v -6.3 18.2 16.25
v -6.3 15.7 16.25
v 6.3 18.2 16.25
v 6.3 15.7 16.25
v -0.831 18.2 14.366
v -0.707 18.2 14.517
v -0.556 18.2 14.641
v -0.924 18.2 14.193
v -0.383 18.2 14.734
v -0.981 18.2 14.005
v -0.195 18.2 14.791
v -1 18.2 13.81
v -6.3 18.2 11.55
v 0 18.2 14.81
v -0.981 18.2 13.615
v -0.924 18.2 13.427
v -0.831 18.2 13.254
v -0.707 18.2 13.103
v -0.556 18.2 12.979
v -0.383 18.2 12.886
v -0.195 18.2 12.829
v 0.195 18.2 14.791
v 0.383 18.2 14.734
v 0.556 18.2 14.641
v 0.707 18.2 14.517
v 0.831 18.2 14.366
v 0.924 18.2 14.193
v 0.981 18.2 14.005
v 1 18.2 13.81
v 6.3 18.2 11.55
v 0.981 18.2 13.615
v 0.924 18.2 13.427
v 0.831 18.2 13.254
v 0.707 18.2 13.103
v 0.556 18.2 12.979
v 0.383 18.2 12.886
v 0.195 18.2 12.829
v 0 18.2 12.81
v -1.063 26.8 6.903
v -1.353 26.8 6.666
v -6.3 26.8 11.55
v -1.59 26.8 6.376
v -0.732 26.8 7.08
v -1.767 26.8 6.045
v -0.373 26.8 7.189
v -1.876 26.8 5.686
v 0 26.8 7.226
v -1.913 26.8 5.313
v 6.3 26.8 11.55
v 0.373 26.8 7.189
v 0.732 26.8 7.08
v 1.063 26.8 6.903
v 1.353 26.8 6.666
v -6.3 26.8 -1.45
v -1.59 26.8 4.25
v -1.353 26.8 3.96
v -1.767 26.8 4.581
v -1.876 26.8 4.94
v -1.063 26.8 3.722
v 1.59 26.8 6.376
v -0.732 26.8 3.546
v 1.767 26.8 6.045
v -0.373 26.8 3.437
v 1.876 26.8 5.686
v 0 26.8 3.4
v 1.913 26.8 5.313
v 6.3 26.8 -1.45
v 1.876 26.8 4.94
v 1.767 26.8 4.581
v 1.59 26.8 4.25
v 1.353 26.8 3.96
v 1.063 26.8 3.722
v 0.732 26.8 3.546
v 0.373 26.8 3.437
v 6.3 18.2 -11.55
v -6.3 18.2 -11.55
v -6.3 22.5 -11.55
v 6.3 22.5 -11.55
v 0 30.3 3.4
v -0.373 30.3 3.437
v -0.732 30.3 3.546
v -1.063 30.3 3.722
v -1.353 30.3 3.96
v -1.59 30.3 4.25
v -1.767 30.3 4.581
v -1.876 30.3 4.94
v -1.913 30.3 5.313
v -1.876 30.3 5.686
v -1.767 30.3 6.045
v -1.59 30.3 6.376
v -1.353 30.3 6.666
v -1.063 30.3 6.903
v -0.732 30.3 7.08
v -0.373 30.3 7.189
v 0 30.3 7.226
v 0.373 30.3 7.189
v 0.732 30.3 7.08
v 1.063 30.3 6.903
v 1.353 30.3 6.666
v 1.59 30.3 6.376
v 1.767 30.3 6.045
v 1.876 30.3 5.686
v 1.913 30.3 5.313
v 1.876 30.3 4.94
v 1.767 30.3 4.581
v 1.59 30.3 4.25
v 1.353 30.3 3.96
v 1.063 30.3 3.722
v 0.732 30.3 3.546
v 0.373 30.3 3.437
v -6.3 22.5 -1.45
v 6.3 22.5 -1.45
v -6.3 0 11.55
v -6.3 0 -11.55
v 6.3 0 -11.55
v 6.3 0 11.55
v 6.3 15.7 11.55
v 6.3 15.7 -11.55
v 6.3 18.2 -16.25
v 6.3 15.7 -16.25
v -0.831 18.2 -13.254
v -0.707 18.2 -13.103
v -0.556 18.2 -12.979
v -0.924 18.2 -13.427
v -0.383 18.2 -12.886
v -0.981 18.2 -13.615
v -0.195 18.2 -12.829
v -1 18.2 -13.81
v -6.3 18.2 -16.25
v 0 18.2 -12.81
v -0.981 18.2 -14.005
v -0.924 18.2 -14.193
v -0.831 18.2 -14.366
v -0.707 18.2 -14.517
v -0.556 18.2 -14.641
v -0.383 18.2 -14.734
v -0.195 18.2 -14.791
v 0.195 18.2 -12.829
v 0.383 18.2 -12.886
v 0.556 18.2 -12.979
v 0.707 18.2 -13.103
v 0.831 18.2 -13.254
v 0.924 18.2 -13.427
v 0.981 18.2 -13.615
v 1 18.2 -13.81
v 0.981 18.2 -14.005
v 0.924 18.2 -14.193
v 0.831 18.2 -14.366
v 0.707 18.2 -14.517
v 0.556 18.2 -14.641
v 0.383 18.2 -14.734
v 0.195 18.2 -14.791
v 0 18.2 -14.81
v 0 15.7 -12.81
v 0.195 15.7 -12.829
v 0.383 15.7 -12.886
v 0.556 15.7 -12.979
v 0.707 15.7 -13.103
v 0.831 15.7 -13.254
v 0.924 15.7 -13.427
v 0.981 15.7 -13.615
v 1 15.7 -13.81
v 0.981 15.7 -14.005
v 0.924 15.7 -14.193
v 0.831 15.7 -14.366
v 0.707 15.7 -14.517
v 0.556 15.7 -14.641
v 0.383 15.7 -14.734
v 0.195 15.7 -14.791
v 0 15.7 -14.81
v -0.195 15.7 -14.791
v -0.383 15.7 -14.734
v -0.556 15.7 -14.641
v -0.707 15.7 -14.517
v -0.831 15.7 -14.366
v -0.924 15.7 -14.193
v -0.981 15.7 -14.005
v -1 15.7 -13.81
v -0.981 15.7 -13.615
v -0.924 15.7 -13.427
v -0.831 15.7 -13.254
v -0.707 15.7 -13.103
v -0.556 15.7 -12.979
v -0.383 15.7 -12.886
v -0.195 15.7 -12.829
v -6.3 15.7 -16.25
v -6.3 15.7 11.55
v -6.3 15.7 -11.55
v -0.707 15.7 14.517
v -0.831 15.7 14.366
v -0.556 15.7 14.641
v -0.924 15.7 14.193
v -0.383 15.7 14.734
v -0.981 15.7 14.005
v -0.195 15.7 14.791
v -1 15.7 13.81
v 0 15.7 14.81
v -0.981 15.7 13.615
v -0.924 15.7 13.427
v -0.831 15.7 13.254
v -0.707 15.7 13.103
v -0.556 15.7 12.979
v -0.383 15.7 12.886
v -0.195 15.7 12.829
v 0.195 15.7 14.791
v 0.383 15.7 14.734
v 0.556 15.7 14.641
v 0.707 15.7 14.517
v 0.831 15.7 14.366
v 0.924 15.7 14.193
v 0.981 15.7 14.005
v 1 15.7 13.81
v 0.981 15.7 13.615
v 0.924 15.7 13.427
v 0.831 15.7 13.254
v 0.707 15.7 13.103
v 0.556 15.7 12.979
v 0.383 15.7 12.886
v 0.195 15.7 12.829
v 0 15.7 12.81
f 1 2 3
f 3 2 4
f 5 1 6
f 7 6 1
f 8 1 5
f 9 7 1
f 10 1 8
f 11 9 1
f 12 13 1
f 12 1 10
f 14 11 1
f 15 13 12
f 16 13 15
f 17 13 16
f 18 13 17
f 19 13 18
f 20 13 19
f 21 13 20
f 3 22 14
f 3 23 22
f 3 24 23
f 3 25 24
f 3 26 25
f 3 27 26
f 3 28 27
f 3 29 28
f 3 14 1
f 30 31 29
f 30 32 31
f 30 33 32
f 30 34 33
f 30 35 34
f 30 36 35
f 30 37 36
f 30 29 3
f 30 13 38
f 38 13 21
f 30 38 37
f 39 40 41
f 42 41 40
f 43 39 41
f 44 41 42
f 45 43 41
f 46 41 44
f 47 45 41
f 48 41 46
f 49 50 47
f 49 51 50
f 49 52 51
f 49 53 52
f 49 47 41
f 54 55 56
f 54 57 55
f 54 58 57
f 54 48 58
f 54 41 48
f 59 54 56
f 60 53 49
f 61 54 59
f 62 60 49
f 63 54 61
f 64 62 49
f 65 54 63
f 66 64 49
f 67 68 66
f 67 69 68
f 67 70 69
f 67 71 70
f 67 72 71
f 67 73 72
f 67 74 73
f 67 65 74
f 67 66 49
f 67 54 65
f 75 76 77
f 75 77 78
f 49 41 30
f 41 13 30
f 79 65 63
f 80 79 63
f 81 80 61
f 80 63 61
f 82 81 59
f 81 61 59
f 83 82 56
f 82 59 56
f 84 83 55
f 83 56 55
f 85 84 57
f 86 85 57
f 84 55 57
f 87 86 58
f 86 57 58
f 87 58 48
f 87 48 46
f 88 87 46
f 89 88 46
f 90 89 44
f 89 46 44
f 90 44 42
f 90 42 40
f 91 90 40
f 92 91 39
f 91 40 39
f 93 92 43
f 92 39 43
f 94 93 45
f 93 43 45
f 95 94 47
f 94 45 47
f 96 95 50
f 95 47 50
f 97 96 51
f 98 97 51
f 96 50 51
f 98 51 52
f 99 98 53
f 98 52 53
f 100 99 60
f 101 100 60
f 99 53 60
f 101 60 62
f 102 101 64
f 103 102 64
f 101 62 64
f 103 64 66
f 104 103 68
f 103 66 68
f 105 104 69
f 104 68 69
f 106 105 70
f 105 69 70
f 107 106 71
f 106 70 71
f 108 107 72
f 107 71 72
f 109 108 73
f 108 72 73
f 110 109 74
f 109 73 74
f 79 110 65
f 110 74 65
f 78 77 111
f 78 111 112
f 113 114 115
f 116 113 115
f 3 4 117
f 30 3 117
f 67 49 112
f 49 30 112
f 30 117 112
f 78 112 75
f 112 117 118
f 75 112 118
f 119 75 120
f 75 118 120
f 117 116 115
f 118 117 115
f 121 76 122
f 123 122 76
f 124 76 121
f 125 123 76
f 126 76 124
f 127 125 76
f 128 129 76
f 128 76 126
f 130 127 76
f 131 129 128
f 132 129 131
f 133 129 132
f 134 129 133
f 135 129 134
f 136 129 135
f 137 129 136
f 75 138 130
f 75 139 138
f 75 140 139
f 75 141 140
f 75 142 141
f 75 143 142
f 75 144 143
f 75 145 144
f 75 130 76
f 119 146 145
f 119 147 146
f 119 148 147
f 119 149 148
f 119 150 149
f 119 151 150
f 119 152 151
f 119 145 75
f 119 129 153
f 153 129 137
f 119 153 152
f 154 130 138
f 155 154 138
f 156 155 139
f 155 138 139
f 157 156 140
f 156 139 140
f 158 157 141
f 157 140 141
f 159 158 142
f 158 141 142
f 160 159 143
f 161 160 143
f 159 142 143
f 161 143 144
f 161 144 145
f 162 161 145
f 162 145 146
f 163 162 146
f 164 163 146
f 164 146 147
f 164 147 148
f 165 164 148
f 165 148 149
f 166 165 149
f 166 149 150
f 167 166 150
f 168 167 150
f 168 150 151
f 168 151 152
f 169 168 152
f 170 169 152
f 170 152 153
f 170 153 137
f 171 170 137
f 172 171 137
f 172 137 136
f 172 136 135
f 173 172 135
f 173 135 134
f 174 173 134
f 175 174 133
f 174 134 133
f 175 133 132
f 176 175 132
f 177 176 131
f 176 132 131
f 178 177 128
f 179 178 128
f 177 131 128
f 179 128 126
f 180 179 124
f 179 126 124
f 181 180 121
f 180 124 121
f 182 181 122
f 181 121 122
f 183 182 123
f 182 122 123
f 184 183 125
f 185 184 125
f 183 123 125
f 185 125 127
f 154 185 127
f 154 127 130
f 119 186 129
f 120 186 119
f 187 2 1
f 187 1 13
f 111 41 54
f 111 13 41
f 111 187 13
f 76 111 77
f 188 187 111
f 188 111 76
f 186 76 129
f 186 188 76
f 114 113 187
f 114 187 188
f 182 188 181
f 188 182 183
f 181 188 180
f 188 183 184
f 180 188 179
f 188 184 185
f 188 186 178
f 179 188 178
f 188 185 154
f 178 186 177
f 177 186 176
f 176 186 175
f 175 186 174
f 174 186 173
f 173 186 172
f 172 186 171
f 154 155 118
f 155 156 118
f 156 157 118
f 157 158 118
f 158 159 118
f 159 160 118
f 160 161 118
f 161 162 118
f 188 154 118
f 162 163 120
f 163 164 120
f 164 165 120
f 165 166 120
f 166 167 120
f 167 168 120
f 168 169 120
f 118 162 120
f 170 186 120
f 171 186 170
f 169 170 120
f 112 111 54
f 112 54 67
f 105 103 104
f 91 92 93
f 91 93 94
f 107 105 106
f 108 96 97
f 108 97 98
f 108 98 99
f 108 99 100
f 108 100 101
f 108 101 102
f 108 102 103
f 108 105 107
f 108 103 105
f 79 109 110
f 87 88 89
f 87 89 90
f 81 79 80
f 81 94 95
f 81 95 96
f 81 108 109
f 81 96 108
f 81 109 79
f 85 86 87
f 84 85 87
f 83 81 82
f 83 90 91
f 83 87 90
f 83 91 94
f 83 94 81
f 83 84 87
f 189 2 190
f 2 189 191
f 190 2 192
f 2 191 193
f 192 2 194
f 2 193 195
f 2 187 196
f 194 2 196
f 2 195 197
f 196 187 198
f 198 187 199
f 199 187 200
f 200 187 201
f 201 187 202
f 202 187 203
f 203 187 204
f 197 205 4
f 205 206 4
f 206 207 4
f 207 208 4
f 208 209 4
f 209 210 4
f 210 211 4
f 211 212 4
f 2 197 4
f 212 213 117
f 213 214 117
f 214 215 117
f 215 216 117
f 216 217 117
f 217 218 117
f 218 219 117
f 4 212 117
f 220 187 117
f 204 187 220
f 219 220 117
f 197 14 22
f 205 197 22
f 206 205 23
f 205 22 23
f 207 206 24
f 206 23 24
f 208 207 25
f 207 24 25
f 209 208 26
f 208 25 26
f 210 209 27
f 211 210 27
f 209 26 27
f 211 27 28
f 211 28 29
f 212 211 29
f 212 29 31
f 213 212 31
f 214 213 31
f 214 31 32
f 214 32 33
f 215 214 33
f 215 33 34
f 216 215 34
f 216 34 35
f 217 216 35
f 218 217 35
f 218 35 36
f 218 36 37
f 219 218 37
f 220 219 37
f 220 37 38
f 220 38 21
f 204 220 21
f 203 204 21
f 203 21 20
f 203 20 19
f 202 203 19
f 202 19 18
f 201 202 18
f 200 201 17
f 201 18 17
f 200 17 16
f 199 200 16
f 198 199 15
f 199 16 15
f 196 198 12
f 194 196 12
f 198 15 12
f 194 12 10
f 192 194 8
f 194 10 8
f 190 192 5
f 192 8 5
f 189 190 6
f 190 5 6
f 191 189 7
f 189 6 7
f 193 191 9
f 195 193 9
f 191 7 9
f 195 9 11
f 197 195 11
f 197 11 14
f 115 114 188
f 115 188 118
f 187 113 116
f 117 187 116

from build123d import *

# Parameters (mm, degrees)
SKETCH2_W           = 12.6
SKETCH2_H           = 23.1
BOSS_EXTRUDE1_DEPTH = 15.7
SKETCH3_W           = 12.6
SKETCH3_H           = 32.5
BOSS_EXTRUDE2_DEPTH = 2.5
SKETCH4_W           = 12.6
SKETCH4_H           = 23.1
BOSS_EXTRUDE3_DEPTH = 4.3
SKETCH5_W           = 12.6
SKETCH5_H           = 13
BOSS_EXTRUDE4_DEPTH = 4.3
SKETCH7_R           = 1.912877934
BOSS_EXTRUDE6_DEPTH = 3.5
SKETCH8_R           = 1
CUT_EXTRUDE1_DEPTH  = 3.5


with BuildPart() as part:
    # Sketch2 → Boss-Extrude1 (new body)
    with BuildSketch(Plane(origin=(0, 0, 0), x_dir=(1, 0, 0), z_dir=(0, 1, 0))):
        Rectangle(SKETCH2_W, SKETCH2_H)
    extrude(amount=BOSS_EXTRUDE1_DEPTH)

    # Sketch3 → Boss-Extrude2 (add)
    with BuildSketch(Plane(origin=(0, 15.7, 0), x_dir=(1, 0, 0), z_dir=(0, 1, 0))):
        Rectangle(SKETCH3_W, SKETCH3_H)
    extrude(amount=BOSS_EXTRUDE2_DEPTH)

    # Sketch4 → Boss-Extrude3 (add)
    with BuildSketch(Plane(origin=(0, 18.2, 0), x_dir=(1, 0, 0), z_dir=(0, 1, 0))):
        Rectangle(SKETCH4_W, SKETCH4_H)
    extrude(amount=BOSS_EXTRUDE3_DEPTH)

    # Sketch5 → Boss-Extrude4 (add)
    with BuildSketch(Plane(origin=(0, 22.5, 0), x_dir=(1, 0, 0), z_dir=(0, 1, 0))):
        with Locations((0, -5.05)):
            Rectangle(SKETCH5_W, SKETCH5_H)
    extrude(amount=BOSS_EXTRUDE4_DEPTH)

    # Sketch7 → Boss-Extrude6 (add)
    with BuildSketch(Plane(origin=(0, 26.8, 0), x_dir=(1, 0, 0), z_dir=(0, 1, 0))):
        with Locations(Location((0, -5.312938635, 0), (0, 0, 90))):
            Circle(SKETCH7_R)
    extrude(amount=BOSS_EXTRUDE6_DEPTH)

    # Sketch8 → Cut-Extrude1 (cut)
    with BuildSketch(Plane(origin=(0, 18.2, 0), x_dir=(1, 0, 0), z_dir=(0, 1, 0))):
        with Locations(Location((0, 13.81, 0), (0, 0, 270))):
            Circle(SKETCH8_R)
        with Locations(Location((0, -13.81, 0), (0, 0, 270))):
            Circle(SKETCH8_R)
    extrude(amount=-CUT_EXTRUDE1_DEPTH, mode=Mode.SUBTRACT)


solid = part.part
